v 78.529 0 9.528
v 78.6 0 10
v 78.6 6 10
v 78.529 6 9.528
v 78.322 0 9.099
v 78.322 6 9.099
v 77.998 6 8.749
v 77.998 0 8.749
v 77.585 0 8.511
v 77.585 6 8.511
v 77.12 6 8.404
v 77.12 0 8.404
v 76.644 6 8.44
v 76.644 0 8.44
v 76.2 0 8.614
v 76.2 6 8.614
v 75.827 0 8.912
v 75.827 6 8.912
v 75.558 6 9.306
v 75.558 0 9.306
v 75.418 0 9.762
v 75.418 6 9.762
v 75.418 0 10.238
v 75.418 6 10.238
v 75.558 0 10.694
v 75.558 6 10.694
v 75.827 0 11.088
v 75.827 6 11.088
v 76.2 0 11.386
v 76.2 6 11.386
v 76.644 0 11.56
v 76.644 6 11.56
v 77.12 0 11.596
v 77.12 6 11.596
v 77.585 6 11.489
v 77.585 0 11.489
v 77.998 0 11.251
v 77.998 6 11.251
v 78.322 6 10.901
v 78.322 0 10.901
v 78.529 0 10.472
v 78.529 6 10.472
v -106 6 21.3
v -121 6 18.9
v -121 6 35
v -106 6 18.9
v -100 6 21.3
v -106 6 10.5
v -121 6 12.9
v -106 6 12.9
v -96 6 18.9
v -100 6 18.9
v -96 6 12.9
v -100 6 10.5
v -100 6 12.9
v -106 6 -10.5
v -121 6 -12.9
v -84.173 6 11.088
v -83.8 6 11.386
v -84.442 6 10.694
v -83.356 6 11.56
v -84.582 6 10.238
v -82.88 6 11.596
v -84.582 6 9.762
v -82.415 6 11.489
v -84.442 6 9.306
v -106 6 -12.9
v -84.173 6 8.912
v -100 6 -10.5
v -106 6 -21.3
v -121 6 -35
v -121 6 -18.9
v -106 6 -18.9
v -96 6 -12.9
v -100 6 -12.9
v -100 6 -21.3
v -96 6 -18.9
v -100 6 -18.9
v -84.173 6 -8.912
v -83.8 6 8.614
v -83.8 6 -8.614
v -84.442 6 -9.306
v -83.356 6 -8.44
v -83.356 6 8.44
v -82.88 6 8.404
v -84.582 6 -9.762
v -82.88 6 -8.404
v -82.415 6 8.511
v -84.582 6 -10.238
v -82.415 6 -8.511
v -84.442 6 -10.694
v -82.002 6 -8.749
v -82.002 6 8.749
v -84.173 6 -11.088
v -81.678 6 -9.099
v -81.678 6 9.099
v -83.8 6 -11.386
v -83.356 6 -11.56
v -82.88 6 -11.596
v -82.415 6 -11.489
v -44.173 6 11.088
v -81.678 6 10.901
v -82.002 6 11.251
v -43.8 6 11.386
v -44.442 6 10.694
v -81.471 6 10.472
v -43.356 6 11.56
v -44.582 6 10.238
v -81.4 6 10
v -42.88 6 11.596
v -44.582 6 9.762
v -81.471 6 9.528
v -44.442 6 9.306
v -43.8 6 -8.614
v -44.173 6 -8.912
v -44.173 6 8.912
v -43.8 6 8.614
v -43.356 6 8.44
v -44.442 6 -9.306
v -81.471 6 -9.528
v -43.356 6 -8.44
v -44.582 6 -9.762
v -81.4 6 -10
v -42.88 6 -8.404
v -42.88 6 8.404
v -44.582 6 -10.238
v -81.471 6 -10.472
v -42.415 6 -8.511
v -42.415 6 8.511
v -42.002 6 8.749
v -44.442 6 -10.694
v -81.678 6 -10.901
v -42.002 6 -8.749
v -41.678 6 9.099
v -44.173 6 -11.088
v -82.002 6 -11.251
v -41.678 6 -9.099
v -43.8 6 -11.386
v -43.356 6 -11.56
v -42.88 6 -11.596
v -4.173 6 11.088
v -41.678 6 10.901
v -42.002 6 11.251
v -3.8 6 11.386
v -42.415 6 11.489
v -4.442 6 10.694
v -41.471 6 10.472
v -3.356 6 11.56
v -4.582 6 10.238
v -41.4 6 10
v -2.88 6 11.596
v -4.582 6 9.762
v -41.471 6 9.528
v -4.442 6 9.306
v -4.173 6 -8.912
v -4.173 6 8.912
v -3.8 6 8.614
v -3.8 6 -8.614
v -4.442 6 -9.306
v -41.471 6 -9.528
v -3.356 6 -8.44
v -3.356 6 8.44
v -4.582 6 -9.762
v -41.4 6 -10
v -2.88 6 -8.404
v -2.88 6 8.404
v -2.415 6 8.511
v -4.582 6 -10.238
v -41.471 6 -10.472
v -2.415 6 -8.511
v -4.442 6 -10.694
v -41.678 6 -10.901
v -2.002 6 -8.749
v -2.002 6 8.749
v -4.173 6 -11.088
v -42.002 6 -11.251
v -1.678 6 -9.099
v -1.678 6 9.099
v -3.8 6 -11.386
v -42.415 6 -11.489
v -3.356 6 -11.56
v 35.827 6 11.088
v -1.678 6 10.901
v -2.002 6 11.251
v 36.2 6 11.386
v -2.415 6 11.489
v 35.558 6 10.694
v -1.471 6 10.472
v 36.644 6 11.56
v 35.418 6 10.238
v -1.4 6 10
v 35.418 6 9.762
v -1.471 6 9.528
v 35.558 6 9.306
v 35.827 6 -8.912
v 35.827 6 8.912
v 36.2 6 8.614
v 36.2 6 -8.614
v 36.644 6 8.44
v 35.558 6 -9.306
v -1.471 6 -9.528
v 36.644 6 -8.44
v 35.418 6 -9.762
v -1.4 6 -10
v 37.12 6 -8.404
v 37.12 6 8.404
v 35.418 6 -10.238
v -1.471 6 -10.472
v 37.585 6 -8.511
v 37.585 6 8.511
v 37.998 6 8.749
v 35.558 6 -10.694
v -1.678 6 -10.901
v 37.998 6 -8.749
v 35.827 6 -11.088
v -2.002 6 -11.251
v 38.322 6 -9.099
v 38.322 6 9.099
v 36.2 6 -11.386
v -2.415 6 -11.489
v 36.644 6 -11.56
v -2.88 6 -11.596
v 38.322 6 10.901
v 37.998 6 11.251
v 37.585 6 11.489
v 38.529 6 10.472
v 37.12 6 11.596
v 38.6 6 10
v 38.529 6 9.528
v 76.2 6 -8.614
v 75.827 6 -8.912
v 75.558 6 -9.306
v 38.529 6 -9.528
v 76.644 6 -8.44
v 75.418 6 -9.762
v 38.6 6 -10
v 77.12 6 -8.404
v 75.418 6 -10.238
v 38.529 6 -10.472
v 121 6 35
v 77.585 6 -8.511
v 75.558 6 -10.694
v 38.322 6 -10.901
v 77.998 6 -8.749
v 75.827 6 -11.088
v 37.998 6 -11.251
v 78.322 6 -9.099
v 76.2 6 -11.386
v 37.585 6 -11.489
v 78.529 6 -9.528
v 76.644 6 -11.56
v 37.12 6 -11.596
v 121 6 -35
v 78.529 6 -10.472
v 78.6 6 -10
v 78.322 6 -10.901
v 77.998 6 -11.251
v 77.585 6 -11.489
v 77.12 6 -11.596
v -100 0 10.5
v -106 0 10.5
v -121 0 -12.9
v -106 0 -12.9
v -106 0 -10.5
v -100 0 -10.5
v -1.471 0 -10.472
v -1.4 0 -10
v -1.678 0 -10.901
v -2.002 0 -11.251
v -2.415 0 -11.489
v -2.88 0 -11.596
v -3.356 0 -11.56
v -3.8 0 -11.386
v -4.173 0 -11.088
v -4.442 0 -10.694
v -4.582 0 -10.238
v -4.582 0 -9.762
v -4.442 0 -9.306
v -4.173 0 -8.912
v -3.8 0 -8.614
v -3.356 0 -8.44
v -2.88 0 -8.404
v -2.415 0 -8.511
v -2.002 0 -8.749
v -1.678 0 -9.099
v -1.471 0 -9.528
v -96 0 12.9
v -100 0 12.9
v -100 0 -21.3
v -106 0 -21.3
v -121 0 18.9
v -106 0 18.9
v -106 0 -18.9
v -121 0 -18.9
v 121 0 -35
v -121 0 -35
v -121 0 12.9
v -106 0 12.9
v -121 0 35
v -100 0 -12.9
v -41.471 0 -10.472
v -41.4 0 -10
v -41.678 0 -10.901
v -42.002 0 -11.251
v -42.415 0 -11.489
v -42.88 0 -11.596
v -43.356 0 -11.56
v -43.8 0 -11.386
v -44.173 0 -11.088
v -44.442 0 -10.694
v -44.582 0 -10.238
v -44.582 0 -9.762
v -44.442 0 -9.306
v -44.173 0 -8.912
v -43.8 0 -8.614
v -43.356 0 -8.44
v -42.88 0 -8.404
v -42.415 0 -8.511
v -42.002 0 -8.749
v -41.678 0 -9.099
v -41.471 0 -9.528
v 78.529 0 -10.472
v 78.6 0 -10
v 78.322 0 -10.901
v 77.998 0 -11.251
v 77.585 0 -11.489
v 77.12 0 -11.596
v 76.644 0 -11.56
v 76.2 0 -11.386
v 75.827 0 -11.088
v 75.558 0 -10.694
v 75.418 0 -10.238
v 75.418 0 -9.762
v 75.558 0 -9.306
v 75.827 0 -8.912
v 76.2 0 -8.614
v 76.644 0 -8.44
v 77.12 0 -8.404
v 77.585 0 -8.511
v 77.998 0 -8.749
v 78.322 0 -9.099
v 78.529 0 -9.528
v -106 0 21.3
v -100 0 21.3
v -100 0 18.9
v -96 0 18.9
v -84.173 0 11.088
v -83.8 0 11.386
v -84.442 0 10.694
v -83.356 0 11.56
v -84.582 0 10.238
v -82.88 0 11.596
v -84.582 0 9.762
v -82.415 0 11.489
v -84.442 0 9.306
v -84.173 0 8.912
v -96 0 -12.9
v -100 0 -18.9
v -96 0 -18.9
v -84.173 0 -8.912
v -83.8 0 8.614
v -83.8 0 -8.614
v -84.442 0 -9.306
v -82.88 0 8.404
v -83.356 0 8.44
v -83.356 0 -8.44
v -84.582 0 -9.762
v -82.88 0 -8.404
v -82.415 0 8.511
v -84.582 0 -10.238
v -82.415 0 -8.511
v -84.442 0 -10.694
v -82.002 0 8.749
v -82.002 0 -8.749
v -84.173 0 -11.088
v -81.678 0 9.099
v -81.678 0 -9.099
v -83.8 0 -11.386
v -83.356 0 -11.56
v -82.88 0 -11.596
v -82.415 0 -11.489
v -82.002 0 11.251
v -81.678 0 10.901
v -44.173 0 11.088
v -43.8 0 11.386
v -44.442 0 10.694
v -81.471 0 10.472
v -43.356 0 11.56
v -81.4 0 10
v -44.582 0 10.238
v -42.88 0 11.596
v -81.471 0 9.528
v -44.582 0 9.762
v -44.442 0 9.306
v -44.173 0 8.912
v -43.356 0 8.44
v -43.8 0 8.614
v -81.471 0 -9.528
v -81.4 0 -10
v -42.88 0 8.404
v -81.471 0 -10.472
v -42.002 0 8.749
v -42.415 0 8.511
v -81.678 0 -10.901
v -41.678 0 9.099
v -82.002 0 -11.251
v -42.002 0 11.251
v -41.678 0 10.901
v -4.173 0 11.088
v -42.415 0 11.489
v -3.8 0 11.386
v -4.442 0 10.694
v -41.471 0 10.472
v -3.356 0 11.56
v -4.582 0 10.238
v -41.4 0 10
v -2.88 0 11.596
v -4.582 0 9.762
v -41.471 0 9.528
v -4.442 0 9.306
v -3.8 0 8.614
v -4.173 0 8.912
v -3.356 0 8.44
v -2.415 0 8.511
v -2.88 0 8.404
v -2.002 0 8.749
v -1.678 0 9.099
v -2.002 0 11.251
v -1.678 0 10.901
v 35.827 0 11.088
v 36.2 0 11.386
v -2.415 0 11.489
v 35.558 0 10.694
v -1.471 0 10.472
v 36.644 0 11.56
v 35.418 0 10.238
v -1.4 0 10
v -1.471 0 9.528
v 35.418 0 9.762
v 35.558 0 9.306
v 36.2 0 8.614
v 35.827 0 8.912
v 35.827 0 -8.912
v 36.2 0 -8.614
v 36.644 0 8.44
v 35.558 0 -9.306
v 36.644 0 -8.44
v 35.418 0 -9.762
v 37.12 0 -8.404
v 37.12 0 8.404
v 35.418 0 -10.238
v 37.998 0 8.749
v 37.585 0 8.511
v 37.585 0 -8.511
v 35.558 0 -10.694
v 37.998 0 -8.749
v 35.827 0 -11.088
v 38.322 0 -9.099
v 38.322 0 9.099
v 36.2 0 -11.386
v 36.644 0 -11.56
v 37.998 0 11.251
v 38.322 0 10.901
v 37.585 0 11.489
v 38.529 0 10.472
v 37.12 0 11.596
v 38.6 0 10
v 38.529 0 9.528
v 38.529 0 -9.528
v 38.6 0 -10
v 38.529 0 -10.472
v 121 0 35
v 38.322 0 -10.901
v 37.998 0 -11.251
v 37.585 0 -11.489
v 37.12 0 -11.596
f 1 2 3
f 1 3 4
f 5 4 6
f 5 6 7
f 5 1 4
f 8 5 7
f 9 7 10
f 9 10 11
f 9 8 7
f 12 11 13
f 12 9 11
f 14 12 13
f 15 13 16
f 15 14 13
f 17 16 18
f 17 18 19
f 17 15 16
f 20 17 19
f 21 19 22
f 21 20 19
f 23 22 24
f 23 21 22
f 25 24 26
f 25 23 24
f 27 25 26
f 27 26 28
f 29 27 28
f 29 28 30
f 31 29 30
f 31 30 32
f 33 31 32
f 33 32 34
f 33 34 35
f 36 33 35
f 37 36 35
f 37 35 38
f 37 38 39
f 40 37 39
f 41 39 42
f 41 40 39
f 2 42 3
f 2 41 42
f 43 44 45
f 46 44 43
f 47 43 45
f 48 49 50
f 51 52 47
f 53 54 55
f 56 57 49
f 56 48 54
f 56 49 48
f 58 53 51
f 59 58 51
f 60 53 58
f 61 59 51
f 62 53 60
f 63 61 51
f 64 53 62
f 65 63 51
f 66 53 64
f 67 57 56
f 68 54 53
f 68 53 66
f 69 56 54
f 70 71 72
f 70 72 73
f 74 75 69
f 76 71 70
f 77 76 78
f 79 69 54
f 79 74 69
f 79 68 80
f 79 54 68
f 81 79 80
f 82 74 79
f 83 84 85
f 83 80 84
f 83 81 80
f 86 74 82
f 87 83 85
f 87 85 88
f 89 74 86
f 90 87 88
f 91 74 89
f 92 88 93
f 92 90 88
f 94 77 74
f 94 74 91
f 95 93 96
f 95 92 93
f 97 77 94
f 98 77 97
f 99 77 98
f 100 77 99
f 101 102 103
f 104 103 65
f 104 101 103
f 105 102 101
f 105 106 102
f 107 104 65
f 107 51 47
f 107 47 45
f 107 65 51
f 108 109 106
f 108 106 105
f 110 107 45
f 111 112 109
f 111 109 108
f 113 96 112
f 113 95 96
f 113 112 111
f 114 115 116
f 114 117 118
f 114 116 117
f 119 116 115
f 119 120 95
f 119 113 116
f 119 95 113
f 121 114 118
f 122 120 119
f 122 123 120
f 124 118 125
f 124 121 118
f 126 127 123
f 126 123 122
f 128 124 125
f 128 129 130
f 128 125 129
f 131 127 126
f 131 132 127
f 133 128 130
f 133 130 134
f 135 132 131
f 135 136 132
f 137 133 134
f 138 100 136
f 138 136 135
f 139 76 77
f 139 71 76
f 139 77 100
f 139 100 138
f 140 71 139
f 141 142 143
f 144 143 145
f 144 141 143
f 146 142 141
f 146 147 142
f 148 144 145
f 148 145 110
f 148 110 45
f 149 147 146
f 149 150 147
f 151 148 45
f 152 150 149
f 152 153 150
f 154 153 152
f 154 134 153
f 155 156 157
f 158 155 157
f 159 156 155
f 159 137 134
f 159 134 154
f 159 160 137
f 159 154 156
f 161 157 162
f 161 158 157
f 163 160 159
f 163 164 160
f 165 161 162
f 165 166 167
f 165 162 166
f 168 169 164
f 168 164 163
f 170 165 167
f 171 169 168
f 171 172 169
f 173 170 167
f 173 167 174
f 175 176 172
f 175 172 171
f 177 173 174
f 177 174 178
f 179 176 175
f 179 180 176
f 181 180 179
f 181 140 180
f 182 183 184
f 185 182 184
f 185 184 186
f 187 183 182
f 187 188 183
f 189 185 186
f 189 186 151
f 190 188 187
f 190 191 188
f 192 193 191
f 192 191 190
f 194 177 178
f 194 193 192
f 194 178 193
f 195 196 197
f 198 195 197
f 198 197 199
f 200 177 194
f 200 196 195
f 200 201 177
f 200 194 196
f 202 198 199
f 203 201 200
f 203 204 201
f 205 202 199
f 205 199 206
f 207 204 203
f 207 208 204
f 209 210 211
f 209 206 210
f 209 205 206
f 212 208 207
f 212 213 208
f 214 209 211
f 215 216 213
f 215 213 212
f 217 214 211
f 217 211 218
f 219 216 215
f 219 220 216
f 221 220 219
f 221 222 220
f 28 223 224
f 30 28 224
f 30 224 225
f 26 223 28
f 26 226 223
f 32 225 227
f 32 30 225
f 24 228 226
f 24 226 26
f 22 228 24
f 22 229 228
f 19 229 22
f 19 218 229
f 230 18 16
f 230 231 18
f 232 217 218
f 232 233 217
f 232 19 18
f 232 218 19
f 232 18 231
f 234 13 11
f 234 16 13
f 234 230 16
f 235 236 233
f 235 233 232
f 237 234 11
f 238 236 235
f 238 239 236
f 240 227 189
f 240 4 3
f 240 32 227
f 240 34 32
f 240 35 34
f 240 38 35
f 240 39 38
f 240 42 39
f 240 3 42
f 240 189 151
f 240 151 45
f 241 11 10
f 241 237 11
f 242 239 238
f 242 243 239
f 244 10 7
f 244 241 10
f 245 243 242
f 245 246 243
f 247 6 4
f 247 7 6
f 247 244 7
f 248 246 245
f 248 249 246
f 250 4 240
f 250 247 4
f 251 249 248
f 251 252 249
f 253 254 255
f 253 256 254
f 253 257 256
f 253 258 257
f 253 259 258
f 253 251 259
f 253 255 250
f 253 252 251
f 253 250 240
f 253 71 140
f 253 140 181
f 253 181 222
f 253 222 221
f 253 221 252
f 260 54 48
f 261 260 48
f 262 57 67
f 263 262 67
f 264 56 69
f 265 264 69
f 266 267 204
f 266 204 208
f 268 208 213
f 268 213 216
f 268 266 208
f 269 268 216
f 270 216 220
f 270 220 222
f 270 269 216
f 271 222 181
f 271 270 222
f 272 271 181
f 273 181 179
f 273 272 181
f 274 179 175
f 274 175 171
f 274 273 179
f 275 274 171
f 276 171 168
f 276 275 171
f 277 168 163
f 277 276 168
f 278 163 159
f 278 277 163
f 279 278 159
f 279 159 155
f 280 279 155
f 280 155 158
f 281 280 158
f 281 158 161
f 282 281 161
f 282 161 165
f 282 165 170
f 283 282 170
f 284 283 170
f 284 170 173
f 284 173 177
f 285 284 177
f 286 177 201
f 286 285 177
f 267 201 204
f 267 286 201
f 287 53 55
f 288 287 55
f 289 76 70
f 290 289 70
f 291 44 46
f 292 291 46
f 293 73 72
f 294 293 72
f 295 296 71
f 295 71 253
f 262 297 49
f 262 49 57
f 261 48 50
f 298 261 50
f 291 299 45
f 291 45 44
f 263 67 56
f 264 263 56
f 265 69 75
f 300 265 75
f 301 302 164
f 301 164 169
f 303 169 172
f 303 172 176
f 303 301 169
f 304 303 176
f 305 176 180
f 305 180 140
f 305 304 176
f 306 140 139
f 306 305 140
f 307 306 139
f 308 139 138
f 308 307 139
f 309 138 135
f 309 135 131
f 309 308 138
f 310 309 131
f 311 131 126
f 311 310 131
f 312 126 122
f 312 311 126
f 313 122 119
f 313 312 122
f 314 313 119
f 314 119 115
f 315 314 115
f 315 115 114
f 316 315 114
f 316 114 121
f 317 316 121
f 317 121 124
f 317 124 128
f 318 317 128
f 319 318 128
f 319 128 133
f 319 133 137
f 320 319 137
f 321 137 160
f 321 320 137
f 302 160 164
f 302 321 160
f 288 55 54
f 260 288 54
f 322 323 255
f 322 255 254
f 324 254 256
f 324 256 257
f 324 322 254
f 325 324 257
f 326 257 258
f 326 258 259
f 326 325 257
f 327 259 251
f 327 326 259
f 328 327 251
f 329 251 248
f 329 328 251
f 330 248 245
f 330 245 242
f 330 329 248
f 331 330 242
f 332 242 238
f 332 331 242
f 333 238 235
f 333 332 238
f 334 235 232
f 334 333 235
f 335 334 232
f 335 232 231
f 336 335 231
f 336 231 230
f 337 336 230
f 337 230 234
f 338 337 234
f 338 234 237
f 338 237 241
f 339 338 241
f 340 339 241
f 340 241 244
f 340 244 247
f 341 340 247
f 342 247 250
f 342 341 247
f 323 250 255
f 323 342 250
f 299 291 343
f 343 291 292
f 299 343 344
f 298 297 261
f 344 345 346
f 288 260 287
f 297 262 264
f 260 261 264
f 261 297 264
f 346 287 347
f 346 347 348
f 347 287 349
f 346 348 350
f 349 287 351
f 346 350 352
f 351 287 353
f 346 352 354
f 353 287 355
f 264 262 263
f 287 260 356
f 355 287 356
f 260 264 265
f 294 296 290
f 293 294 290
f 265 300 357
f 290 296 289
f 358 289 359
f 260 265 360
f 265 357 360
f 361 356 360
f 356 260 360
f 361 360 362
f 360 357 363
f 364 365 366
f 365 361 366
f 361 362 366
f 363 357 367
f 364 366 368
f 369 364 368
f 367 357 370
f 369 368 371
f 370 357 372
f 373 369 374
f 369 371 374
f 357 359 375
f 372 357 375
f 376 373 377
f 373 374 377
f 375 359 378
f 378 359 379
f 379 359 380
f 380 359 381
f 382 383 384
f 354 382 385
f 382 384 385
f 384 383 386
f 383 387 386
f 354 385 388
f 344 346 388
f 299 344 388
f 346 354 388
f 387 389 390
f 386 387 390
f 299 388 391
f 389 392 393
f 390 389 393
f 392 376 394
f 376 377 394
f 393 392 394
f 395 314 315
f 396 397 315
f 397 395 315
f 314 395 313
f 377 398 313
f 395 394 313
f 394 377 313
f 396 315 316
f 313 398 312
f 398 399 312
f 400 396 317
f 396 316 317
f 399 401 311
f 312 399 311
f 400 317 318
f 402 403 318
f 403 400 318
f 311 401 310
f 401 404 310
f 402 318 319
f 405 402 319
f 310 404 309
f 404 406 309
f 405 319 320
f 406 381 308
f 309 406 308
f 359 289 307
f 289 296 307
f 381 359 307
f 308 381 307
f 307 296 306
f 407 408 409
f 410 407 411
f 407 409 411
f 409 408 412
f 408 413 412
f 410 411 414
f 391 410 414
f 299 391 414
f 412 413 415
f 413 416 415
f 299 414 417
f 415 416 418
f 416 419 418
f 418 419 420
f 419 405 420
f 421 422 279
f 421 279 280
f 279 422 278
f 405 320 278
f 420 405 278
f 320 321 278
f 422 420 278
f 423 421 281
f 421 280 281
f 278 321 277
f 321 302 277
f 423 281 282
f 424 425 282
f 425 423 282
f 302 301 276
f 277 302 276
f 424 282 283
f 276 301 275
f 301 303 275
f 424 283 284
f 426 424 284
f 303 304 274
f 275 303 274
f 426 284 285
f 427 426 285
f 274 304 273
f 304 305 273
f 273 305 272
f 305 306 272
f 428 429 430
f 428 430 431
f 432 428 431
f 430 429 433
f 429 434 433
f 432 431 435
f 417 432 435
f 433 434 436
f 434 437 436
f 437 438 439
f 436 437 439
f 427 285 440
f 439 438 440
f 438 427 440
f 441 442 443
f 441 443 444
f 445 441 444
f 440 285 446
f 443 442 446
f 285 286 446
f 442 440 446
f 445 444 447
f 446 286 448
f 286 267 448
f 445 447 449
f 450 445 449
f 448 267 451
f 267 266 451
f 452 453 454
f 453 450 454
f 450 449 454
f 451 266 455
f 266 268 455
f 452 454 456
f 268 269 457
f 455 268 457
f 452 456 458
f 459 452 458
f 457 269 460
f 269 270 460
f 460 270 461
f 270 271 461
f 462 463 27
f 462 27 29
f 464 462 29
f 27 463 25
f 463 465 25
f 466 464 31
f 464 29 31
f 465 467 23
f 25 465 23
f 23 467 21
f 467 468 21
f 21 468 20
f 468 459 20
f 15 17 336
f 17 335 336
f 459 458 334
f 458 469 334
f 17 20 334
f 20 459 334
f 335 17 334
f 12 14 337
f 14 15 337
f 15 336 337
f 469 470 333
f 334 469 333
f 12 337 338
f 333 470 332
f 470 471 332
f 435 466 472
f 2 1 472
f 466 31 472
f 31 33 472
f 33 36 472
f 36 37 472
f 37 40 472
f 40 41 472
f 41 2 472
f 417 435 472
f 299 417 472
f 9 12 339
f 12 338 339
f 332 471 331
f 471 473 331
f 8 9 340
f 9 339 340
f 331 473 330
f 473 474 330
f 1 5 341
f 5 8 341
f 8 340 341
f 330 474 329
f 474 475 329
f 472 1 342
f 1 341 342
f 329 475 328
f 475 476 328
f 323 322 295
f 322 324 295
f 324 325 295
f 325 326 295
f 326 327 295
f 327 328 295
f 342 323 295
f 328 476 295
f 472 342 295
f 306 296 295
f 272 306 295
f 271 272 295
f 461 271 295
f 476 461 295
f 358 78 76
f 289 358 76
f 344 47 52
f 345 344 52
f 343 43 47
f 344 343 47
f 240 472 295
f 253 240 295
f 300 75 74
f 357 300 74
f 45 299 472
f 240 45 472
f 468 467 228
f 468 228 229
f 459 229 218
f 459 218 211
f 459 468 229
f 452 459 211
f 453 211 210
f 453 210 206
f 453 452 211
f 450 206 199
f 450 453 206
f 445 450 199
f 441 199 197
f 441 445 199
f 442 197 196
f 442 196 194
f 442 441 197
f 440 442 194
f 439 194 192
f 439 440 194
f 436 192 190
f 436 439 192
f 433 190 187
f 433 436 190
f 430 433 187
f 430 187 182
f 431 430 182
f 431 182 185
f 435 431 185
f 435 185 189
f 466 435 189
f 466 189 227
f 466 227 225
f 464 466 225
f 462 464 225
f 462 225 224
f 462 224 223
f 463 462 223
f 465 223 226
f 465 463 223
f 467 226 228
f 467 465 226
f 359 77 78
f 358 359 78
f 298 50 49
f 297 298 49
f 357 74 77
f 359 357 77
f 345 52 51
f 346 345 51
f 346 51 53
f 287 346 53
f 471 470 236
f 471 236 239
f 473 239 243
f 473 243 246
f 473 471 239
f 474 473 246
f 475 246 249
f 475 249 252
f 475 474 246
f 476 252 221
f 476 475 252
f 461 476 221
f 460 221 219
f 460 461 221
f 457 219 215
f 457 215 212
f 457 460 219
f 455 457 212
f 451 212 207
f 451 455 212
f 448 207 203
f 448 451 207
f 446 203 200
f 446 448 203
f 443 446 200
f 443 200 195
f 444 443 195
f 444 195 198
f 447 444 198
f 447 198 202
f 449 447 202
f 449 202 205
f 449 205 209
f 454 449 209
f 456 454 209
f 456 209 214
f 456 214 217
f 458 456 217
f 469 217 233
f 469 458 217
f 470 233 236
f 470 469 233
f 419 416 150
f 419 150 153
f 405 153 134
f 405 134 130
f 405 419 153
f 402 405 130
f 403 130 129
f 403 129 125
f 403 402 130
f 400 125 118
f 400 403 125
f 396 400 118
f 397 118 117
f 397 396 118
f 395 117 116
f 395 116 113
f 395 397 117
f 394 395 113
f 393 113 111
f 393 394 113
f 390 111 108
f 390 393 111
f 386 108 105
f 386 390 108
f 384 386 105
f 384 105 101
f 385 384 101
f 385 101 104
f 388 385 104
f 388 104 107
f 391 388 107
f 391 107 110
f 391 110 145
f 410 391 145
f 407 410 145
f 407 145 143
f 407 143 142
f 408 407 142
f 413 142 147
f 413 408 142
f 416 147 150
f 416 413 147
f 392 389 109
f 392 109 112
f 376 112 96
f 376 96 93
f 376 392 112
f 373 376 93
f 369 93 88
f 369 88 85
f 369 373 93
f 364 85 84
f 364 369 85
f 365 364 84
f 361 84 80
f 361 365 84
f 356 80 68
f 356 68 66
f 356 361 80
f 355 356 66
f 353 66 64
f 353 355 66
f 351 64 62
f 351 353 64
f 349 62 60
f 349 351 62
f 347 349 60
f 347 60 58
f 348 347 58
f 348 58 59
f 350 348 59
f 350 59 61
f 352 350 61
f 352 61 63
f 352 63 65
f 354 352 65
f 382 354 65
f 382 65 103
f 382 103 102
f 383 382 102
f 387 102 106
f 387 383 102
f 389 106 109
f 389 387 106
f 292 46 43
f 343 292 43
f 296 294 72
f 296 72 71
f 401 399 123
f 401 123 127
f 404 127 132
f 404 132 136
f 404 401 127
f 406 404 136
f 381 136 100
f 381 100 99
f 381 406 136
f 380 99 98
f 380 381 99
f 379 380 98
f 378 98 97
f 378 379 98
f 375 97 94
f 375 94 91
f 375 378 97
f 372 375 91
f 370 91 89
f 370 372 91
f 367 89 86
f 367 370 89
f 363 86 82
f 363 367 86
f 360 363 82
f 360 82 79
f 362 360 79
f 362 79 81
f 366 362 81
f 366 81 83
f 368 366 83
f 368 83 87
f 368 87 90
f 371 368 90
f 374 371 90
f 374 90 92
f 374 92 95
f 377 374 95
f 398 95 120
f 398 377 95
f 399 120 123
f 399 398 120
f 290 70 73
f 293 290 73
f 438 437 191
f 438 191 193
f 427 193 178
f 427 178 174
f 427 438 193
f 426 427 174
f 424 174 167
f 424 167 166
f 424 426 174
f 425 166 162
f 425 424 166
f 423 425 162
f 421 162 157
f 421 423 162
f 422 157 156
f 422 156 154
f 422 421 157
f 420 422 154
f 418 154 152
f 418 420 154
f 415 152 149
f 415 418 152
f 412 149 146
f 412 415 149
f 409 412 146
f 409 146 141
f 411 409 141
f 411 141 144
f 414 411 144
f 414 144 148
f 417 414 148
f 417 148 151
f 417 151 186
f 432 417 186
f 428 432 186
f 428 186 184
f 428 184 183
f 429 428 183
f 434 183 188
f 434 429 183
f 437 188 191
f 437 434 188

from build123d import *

# Parameters (mm, degrees)
SKETCH1_W           = 242
SKETCH1_H           = 70
SKETCH1_R           = 1.6
BOSS_EXTRUDE1_DEPTH = 6
CUT_EXTRUDE2_DEPTH  = 7


with BuildPart() as part:
    # Sketch1 → Boss-Extrude1 (new body)
    with BuildSketch(Plane(origin=(0, 0, 0), x_dir=(1, 0, 0), z_dir=(0, 1, 0))):
        Rectangle(SKETCH1_W, SKETCH1_H)
        with Locations((77, -10)):
            Circle(SKETCH1_R, mode=Mode.SUBTRACT)
        with Locations((77, 10)):
            Circle(SKETCH1_R, mode=Mode.SUBTRACT)
        with Locations((37, -10)):
            Circle(SKETCH1_R, mode=Mode.SUBTRACT)
        with Locations((37, 10)):
            Circle(SKETCH1_R, mode=Mode.SUBTRACT)
        with Locations((-3, -10)):
            Circle(SKETCH1_R, mode=Mode.SUBTRACT)
        with Locations((-3, 10)):
            Circle(SKETCH1_R, mode=Mode.SUBTRACT)
        with Locations((-43, -10)):
            Circle(SKETCH1_R, mode=Mode.SUBTRACT)
        with Locations((-43, 10)):
            Circle(SKETCH1_R, mode=Mode.SUBTRACT)
        with Locations((-83, -10)):
            Circle(SKETCH1_R, mode=Mode.SUBTRACT)
        with Locations((-83, 10)):
            Circle(SKETCH1_R, mode=Mode.SUBTRACT)
    extrude(amount=BOSS_EXTRUDE1_DEPTH)

    # Sketch3 → Cut-Extrude2 (cut, through all)
    with BuildSketch(Plane(origin=(0, 6, 0), x_dir=(1, 0, 0), z_dir=(0, 1, 0))):
        Polygon((-121, 12.9), (-106, 12.9), (-106, 10.5), (-100, 10.5), (-100, 12.9), (-96, 12.9), (-96, 18.9), (-100, 18.9), (-100, 21.3), (-106, 21.3), (-106, 18.9), (-121, 18.9), align=None)
        Polygon((-106, -18.9), (-106, -21.3), (-100, -21.3), (-100, -18.9), (-96, -18.9), (-96, -12.9), (-100, -12.9), (-100, -10.5), (-106, -10.5), (-106, -12.9), (-121, -12.9), (-121, -18.9), align=None)
    extrude(amount=-CUT_EXTRUDE2_DEPTH, mode=Mode.SUBTRACT)


solid = part.part
